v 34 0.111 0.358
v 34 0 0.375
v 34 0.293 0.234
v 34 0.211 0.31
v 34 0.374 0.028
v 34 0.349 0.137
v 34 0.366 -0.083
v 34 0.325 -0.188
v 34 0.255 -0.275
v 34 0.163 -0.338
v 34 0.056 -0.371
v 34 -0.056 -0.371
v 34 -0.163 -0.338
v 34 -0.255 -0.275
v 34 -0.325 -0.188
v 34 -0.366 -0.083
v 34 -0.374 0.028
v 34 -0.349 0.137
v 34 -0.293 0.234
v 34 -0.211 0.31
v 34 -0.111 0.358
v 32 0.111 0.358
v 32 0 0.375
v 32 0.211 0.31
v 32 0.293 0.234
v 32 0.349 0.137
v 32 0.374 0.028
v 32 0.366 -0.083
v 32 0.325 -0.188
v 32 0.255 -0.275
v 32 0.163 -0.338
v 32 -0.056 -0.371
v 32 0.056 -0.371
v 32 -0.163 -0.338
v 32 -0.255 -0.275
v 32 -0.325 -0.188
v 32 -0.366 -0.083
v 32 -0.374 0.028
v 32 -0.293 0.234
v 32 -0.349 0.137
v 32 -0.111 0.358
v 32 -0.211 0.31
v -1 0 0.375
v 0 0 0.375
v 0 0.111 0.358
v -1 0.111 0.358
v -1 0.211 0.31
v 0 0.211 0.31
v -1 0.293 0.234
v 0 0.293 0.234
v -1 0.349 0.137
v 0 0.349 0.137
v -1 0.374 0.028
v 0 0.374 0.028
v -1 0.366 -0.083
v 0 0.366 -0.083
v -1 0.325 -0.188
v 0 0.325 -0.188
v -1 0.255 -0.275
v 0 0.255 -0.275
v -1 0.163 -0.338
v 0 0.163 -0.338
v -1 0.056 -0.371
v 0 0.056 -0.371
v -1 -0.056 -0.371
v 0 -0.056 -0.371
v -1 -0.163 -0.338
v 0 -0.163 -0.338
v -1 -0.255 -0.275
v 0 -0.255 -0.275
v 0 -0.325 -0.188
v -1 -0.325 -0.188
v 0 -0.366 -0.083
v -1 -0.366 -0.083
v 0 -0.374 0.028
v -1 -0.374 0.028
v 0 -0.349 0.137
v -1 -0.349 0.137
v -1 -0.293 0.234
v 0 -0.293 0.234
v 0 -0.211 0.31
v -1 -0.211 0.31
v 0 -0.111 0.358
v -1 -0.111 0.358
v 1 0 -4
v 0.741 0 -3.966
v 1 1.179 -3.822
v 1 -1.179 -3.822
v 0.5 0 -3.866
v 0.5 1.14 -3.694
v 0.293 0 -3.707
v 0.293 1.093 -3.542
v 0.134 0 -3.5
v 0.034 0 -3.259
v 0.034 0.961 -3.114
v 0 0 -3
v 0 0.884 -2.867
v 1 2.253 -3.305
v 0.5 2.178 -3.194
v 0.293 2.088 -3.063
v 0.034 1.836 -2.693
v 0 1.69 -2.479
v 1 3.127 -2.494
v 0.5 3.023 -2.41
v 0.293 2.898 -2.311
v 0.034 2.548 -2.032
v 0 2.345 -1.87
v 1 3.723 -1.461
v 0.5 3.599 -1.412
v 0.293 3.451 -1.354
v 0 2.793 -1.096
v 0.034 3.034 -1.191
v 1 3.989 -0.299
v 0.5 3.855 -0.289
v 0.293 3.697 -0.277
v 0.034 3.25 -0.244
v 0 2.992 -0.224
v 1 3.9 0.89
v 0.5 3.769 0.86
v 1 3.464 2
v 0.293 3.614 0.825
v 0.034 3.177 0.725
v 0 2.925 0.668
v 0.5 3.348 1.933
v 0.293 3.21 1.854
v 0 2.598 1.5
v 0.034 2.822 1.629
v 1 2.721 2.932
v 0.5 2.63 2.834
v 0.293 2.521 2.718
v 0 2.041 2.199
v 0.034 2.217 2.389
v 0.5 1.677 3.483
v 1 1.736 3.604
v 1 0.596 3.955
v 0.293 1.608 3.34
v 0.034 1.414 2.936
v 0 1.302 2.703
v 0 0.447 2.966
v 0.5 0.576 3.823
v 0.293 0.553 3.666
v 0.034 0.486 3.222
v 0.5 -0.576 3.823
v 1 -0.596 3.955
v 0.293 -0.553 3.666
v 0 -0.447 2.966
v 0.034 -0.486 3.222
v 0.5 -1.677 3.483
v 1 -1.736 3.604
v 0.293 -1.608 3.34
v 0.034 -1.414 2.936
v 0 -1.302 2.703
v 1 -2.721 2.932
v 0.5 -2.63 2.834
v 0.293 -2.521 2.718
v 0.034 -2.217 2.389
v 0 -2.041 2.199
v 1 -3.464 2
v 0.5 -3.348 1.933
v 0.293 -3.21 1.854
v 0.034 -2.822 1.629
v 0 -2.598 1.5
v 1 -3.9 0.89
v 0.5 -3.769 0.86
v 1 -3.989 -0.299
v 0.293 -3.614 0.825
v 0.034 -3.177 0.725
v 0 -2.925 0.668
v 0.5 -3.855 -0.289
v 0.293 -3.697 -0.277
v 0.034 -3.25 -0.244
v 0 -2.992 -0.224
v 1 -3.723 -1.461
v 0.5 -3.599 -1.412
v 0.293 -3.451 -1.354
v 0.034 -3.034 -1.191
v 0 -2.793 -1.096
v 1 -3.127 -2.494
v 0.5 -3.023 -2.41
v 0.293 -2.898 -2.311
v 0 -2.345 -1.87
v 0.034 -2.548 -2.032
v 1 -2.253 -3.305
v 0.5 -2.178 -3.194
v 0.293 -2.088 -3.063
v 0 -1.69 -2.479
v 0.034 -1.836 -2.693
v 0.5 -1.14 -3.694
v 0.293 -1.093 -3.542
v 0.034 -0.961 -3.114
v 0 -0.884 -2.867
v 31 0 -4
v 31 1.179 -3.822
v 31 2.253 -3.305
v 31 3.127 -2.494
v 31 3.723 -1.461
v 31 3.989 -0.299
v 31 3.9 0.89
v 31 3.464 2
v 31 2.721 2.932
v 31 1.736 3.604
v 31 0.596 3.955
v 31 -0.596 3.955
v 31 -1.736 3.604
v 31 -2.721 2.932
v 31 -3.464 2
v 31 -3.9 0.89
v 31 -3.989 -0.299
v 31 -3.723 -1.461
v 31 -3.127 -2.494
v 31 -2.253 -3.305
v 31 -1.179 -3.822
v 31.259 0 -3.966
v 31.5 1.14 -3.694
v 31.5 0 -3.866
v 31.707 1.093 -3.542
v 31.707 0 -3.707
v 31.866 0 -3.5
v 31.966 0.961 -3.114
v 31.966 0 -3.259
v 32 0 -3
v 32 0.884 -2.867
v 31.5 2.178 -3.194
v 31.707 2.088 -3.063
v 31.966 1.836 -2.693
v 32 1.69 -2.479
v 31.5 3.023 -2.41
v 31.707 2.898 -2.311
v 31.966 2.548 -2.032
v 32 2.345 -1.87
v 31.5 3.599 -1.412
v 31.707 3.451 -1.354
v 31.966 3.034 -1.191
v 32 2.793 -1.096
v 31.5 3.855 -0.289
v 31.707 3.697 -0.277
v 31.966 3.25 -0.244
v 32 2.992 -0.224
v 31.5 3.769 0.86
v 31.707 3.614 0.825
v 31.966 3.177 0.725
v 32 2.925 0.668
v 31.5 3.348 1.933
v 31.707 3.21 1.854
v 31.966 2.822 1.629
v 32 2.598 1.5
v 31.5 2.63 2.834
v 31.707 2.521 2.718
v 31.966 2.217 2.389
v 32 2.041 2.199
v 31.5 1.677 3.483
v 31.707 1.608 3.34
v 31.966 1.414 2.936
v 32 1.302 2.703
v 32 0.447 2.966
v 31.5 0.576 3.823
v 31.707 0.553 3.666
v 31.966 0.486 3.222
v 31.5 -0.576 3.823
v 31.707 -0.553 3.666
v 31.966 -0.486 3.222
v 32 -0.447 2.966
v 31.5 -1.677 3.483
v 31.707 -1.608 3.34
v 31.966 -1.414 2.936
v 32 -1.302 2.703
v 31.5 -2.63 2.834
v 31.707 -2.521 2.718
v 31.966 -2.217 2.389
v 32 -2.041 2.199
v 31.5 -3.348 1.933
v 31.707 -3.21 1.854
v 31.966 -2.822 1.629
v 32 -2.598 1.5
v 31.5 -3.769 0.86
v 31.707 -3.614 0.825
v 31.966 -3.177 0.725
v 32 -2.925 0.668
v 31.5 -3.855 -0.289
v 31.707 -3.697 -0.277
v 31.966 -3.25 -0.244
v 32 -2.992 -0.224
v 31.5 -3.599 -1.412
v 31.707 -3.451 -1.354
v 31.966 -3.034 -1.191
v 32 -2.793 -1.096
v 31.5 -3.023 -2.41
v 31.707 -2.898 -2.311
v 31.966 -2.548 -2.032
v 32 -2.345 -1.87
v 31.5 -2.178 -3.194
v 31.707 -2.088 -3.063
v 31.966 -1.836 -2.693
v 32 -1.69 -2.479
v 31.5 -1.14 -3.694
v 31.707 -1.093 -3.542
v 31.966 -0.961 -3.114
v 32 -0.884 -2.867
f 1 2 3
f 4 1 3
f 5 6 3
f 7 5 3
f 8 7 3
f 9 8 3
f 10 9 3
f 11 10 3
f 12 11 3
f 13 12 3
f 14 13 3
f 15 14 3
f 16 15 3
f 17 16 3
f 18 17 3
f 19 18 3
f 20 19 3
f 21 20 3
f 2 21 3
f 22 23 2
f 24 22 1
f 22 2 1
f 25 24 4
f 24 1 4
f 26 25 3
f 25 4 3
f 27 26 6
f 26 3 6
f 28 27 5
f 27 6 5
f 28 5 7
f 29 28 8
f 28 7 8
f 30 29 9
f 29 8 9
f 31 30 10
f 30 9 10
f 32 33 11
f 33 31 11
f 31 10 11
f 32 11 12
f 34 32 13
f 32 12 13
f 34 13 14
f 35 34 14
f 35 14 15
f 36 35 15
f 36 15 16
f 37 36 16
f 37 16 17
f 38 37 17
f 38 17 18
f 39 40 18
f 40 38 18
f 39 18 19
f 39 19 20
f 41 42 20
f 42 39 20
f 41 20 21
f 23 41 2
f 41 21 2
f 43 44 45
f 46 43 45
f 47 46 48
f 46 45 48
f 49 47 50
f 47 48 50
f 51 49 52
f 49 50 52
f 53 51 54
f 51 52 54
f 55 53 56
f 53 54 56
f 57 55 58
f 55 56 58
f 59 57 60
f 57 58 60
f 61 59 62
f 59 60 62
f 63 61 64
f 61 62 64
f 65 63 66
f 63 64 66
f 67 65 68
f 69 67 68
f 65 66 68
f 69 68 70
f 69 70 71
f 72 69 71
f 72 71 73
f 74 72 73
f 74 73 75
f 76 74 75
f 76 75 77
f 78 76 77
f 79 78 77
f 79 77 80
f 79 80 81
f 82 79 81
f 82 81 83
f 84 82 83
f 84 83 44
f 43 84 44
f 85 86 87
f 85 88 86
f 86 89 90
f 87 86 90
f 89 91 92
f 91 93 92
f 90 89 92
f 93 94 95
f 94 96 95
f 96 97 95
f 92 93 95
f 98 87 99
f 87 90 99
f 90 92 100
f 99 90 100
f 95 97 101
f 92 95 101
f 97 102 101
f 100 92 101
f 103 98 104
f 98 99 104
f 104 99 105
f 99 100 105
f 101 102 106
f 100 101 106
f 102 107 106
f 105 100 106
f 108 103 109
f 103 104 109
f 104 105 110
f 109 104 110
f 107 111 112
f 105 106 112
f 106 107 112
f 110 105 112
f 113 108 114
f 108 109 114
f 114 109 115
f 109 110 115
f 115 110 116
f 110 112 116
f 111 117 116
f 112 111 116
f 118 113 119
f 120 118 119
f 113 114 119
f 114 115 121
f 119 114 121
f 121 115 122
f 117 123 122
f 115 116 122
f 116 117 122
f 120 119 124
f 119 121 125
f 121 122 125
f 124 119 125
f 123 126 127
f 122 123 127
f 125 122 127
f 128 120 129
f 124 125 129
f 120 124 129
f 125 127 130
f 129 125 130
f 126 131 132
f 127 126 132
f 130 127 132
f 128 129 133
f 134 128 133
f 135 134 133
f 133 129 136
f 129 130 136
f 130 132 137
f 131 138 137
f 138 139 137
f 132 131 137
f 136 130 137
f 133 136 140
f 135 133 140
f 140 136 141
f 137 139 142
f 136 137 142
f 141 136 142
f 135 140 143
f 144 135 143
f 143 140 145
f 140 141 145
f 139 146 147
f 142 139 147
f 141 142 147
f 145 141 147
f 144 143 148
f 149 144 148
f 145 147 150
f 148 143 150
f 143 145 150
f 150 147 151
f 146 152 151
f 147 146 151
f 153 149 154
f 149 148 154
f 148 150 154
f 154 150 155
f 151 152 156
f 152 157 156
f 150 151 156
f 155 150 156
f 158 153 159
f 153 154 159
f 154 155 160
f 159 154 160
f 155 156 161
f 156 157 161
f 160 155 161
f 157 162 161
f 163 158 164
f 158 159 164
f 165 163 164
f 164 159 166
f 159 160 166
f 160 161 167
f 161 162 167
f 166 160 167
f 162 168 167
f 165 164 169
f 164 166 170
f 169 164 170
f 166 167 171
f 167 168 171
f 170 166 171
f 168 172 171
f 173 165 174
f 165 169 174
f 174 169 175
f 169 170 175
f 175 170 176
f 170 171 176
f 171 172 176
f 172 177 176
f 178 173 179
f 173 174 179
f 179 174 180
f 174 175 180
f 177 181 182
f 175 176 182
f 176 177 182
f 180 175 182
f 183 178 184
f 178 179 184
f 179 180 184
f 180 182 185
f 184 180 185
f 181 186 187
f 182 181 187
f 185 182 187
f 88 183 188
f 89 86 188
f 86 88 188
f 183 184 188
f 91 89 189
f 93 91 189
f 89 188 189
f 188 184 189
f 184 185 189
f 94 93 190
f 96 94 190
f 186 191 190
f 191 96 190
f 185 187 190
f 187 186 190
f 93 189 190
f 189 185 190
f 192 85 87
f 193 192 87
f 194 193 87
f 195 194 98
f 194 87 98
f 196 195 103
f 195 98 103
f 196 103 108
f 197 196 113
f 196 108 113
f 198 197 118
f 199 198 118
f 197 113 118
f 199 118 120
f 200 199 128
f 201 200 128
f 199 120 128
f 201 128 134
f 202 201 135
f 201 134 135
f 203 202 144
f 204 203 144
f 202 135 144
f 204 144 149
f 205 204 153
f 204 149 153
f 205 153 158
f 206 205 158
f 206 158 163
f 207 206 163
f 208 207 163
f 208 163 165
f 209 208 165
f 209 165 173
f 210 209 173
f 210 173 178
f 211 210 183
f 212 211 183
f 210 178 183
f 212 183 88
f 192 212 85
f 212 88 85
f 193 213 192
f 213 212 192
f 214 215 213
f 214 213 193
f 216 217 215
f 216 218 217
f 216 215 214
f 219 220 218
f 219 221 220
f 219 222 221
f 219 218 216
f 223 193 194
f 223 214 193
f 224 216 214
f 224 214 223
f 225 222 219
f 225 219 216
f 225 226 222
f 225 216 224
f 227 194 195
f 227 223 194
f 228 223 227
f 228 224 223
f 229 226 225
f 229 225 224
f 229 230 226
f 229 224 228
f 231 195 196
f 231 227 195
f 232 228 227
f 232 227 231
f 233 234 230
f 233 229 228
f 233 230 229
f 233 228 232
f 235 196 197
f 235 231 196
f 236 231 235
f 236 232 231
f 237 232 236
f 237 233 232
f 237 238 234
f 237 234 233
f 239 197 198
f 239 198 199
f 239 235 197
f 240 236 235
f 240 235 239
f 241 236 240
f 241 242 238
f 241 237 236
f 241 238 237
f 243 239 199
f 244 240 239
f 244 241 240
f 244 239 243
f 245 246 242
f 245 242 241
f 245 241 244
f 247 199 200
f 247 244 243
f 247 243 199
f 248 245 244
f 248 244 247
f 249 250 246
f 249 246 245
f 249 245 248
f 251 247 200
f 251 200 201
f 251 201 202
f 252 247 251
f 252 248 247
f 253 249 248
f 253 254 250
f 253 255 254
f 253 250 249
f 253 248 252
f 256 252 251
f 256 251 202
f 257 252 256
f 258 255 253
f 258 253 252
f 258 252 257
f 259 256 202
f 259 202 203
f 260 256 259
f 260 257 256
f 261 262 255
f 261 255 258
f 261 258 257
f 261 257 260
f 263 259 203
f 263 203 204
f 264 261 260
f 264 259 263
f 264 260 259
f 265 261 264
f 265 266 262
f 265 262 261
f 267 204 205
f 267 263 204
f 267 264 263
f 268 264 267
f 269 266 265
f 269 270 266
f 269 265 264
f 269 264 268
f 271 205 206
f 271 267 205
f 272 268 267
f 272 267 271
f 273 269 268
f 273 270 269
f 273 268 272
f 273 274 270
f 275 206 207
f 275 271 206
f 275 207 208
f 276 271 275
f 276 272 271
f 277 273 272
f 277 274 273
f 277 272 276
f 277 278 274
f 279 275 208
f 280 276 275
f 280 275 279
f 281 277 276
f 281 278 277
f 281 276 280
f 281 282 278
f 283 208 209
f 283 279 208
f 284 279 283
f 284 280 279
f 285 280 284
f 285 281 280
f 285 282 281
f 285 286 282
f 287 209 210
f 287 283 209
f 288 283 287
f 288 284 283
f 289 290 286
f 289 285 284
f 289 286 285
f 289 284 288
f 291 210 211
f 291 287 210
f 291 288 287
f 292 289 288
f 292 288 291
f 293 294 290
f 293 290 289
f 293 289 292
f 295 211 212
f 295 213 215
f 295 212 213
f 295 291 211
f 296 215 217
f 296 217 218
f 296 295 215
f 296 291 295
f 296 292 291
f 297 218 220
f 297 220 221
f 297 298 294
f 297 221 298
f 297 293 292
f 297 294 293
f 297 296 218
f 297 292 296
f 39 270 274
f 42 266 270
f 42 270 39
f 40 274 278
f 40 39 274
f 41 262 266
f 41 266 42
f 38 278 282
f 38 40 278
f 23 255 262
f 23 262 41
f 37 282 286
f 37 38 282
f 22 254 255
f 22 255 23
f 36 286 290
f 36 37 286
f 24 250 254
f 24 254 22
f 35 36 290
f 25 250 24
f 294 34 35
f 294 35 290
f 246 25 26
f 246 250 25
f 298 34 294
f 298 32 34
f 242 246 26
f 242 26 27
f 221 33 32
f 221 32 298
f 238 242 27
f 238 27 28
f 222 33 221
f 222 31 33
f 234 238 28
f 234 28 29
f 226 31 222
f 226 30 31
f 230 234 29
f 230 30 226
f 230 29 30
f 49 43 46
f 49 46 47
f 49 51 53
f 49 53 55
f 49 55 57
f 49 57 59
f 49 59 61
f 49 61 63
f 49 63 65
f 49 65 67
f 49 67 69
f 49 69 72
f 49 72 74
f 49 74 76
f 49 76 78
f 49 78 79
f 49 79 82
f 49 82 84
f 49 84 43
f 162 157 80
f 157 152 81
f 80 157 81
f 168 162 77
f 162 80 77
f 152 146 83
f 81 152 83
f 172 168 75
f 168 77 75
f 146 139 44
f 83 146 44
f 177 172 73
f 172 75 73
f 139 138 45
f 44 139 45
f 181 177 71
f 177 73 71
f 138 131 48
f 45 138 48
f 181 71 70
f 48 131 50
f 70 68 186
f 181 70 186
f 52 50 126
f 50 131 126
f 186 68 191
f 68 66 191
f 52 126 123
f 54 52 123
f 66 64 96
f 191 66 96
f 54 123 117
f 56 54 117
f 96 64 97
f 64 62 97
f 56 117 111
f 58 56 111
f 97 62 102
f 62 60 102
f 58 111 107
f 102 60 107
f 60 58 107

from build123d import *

# Parameters (mm, degrees)
SKETCH_3_R           = 4
EXTRUDE_1_DEPTH      = 32
FILLET_1_R           = 1
EXTRUDE_2_DEPTH      = 1
EXTRUDE_2_DEPTH_BACK = 34
SKETCH_4_R           = 0.375


with BuildPart() as part:
    # 草图3 → 凸台-拉伸1 (new body)
    with BuildSketch(Plane(origin=(0, 0, 0), x_dir=(0, 0, -1), z_dir=(1, 0, 0))):
        Circle(SKETCH_3_R)
    extrude(amount=EXTRUDE_1_DEPTH)

    # 圆角1
    fillet_1_edges = [part.edges().sort_by_distance(p)[0] for p in [
        (0, 0, 4),
        (32, 0, 4),
    ]]
    fillet(fillet_1_edges, radius=FILLET_1_R)

    # 草图4 → 凸台-拉伸2 (add, two sides: drawn at the far end of the back side and taken through both)
    with BuildSketch(Plane.ZY.offset(-EXTRUDE_2_DEPTH_BACK)):
        Circle(SKETCH_4_R)
    extrude(amount=EXTRUDE_2_DEPTH + EXTRUDE_2_DEPTH_BACK)


solid = part.part
